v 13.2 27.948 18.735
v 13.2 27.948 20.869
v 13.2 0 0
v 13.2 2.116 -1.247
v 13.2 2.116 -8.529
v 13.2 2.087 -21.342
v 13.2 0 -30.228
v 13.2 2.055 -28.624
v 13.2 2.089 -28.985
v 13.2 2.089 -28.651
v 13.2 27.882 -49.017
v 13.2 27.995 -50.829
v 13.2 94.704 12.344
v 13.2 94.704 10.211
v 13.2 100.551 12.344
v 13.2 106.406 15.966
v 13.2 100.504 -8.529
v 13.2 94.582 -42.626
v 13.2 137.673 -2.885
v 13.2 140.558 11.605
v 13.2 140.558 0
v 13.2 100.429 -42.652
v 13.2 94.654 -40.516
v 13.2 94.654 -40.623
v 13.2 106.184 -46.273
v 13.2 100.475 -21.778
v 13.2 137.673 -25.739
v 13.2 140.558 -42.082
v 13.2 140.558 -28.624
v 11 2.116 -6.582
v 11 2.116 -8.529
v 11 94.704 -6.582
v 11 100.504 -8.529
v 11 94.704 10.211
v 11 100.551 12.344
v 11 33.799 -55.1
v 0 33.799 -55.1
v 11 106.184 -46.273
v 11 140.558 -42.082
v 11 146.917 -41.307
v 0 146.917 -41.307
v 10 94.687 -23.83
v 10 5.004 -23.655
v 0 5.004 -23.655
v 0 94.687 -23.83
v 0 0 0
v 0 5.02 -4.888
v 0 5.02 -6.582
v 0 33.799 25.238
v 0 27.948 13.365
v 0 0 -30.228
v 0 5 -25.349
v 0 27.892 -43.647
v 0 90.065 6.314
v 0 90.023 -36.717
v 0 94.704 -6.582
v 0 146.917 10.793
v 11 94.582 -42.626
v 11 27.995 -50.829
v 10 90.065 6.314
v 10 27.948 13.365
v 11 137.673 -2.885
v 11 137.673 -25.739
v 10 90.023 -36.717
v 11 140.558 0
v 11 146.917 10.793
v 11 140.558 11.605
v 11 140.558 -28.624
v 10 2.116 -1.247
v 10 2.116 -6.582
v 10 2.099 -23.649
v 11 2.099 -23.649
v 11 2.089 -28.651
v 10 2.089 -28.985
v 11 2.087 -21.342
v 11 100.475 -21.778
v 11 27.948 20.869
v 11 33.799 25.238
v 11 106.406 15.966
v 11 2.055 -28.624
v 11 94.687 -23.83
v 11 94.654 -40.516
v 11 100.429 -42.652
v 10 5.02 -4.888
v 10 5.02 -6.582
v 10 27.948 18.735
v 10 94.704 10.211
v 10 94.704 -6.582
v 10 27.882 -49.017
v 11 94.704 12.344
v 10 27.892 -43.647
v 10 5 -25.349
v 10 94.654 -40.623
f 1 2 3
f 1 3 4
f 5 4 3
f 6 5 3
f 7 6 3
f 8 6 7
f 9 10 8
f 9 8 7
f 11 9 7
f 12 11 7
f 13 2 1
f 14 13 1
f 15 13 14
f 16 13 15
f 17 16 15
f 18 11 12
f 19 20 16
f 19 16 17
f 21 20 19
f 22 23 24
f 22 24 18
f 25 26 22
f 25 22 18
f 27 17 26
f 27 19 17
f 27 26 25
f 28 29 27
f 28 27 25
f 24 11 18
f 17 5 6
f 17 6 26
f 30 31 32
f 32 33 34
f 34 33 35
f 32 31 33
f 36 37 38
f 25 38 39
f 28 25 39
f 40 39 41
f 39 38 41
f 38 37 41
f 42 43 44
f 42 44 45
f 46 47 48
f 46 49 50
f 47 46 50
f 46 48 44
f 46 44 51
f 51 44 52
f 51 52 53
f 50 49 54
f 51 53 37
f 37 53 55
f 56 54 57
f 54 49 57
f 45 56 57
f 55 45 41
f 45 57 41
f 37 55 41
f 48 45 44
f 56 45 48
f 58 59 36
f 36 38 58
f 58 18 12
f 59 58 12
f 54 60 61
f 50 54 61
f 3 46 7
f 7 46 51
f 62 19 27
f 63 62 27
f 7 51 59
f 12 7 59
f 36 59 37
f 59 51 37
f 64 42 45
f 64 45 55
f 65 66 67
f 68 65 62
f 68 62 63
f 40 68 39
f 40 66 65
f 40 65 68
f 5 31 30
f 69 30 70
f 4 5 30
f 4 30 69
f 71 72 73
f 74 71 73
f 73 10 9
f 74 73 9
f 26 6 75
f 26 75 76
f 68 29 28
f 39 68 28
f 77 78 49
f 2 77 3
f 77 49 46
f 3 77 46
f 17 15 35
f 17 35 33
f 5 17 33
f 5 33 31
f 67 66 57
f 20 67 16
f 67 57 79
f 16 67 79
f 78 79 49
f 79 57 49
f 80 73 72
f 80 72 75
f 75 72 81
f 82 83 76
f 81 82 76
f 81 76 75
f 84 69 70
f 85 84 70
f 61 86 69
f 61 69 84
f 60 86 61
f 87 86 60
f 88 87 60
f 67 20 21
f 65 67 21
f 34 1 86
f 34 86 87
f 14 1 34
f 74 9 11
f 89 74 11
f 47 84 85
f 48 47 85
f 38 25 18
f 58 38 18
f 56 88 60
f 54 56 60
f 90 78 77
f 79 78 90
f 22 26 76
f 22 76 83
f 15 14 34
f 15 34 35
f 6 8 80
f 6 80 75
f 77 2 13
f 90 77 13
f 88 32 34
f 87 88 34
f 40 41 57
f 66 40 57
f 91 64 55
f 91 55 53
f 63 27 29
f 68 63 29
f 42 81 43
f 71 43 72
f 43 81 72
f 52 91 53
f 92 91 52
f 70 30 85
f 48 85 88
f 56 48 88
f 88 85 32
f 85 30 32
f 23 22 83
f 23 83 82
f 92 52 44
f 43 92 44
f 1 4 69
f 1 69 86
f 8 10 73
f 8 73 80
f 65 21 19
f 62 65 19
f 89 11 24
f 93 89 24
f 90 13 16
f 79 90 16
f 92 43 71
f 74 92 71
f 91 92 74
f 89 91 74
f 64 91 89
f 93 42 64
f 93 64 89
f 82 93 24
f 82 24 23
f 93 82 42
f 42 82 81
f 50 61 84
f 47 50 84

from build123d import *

# Parameters (mm, degrees)
BOSS_EXTRUDE1_DEPTH = 13.2
CUT_EXTRUDE1_DEPTH  = 2.2
CUT_EXTRUDE5_DEPTH  = 3.2
CUT_EXTRUDE7_DEPTH  = 47.2


with BuildPart() as part:
    # Sketch1 → Boss-Extrude1 (new body)
    with BuildSketch(Plane(origin=(0, 0, 0), x_dir=(0, 0, -1), z_dir=(1, 0, 0))):
        Polygon((0, 0), (30.22758915, 0), (55.09957656, 33.798540965), (41.306638332, 146.917141225), (-10.793062749, 146.917141225), (-25.237530543, 33.798540965), align=None)
    extrude(amount=BOSS_EXTRUDE1_DEPTH)

    # Sketch2 → Cut-Extrude1 (cut)
    with BuildSketch(Plane(origin=(13.2, 0, 0), x_dir=(0, 0, -1), z_dir=(1, 0, 0))):
        Polygon((28.624161599, 2.054828055), (21.342036292, 2.087122062), (21.778356485, 100.474982686), (42.652153848, 100.428698447), (40.492448974, 94.591340826), (48.720604882, 27.79821975), align=None)
        Polygon((55.09957656, 33.798540965), (46.273401218, 106.183741554), (42.626224982, 94.581878179), (50.828950912, 27.995188239), align=None)
        Polygon((-12.344468939, 94.703766721), (-15.966114176, 106.40555265), (-25.237530543, 33.798540965), (-20.868748173, 27.947791436), align=None)
        Polygon((8.529328424, 100.504360243), (8.529328424, 2.115532151), (1.247131511, 2.115532151), (-18.734951184, 27.947791436), (-10.21067195, 94.703766721), (-12.344468939, 100.550644482), align=None)
        Polygon((-10.793062749, 146.917141225), (-11.605073068, 140.558065069), (0, 140.558065069), (2.885234275, 137.672830794), (15.236290042, 137.672830794), (15.256787792, 146.917141225), align=None)
        Polygon((41.306638332, 146.917141225), (15.256787792, 146.917141225), (15.236290042, 137.672830794), (25.738927324, 137.672830794), (28.624161599, 140.558065069), (42.08202226, 140.558065069), align=None)
    extrude(amount=-CUT_EXTRUDE1_DEPTH, mode=Mode.SUBTRACT)

    # Sketch5 → Cut-Extrude5 (cut)
    with BuildSketch(Plane(origin=(13.2, 0, 0), x_dir=(0, 0, -1), z_dir=(1, 0, 0))):
        Polygon((6.582413404, 94.703766721), (-10.21067195, 94.703766721), (-18.734951184, 27.947791436), (1.247131511, 2.115532151), (6.582413404, 2.115532151), align=None)
        Polygon((49.016878853, 27.881849151), (40.622561704, 94.654291163), (23.829508165, 94.686980269), (23.649277638, 2.098921115), (28.984549423, 2.088535555), align=None)
    extrude(amount=-CUT_EXTRUDE5_DEPTH, mode=Mode.SUBTRACT)

    # Sketch8 → Cut-Extrude7 (cut)
    with BuildSketch(Plane(origin=(10, 0, 0), x_dir=(0, 0, -1), z_dir=(1, 0, 0))):
        Polygon((6.582413404, 94.703766721), (-6.314173101, 90.065077615), (-13.364980543, 27.947791436), (4.888229968, 5.020235463), (6.582413404, 5.020235463), align=None)
        Polygon((25.349112106, 5.000321059), (23.654931879, 5.003618925), (23.829508165, 94.686980269), (36.717040651, 90.023195697), (43.646918386, 27.892302235), align=None)
    extrude(amount=-CUT_EXTRUDE7_DEPTH, mode=Mode.SUBTRACT)


solid = part.part
